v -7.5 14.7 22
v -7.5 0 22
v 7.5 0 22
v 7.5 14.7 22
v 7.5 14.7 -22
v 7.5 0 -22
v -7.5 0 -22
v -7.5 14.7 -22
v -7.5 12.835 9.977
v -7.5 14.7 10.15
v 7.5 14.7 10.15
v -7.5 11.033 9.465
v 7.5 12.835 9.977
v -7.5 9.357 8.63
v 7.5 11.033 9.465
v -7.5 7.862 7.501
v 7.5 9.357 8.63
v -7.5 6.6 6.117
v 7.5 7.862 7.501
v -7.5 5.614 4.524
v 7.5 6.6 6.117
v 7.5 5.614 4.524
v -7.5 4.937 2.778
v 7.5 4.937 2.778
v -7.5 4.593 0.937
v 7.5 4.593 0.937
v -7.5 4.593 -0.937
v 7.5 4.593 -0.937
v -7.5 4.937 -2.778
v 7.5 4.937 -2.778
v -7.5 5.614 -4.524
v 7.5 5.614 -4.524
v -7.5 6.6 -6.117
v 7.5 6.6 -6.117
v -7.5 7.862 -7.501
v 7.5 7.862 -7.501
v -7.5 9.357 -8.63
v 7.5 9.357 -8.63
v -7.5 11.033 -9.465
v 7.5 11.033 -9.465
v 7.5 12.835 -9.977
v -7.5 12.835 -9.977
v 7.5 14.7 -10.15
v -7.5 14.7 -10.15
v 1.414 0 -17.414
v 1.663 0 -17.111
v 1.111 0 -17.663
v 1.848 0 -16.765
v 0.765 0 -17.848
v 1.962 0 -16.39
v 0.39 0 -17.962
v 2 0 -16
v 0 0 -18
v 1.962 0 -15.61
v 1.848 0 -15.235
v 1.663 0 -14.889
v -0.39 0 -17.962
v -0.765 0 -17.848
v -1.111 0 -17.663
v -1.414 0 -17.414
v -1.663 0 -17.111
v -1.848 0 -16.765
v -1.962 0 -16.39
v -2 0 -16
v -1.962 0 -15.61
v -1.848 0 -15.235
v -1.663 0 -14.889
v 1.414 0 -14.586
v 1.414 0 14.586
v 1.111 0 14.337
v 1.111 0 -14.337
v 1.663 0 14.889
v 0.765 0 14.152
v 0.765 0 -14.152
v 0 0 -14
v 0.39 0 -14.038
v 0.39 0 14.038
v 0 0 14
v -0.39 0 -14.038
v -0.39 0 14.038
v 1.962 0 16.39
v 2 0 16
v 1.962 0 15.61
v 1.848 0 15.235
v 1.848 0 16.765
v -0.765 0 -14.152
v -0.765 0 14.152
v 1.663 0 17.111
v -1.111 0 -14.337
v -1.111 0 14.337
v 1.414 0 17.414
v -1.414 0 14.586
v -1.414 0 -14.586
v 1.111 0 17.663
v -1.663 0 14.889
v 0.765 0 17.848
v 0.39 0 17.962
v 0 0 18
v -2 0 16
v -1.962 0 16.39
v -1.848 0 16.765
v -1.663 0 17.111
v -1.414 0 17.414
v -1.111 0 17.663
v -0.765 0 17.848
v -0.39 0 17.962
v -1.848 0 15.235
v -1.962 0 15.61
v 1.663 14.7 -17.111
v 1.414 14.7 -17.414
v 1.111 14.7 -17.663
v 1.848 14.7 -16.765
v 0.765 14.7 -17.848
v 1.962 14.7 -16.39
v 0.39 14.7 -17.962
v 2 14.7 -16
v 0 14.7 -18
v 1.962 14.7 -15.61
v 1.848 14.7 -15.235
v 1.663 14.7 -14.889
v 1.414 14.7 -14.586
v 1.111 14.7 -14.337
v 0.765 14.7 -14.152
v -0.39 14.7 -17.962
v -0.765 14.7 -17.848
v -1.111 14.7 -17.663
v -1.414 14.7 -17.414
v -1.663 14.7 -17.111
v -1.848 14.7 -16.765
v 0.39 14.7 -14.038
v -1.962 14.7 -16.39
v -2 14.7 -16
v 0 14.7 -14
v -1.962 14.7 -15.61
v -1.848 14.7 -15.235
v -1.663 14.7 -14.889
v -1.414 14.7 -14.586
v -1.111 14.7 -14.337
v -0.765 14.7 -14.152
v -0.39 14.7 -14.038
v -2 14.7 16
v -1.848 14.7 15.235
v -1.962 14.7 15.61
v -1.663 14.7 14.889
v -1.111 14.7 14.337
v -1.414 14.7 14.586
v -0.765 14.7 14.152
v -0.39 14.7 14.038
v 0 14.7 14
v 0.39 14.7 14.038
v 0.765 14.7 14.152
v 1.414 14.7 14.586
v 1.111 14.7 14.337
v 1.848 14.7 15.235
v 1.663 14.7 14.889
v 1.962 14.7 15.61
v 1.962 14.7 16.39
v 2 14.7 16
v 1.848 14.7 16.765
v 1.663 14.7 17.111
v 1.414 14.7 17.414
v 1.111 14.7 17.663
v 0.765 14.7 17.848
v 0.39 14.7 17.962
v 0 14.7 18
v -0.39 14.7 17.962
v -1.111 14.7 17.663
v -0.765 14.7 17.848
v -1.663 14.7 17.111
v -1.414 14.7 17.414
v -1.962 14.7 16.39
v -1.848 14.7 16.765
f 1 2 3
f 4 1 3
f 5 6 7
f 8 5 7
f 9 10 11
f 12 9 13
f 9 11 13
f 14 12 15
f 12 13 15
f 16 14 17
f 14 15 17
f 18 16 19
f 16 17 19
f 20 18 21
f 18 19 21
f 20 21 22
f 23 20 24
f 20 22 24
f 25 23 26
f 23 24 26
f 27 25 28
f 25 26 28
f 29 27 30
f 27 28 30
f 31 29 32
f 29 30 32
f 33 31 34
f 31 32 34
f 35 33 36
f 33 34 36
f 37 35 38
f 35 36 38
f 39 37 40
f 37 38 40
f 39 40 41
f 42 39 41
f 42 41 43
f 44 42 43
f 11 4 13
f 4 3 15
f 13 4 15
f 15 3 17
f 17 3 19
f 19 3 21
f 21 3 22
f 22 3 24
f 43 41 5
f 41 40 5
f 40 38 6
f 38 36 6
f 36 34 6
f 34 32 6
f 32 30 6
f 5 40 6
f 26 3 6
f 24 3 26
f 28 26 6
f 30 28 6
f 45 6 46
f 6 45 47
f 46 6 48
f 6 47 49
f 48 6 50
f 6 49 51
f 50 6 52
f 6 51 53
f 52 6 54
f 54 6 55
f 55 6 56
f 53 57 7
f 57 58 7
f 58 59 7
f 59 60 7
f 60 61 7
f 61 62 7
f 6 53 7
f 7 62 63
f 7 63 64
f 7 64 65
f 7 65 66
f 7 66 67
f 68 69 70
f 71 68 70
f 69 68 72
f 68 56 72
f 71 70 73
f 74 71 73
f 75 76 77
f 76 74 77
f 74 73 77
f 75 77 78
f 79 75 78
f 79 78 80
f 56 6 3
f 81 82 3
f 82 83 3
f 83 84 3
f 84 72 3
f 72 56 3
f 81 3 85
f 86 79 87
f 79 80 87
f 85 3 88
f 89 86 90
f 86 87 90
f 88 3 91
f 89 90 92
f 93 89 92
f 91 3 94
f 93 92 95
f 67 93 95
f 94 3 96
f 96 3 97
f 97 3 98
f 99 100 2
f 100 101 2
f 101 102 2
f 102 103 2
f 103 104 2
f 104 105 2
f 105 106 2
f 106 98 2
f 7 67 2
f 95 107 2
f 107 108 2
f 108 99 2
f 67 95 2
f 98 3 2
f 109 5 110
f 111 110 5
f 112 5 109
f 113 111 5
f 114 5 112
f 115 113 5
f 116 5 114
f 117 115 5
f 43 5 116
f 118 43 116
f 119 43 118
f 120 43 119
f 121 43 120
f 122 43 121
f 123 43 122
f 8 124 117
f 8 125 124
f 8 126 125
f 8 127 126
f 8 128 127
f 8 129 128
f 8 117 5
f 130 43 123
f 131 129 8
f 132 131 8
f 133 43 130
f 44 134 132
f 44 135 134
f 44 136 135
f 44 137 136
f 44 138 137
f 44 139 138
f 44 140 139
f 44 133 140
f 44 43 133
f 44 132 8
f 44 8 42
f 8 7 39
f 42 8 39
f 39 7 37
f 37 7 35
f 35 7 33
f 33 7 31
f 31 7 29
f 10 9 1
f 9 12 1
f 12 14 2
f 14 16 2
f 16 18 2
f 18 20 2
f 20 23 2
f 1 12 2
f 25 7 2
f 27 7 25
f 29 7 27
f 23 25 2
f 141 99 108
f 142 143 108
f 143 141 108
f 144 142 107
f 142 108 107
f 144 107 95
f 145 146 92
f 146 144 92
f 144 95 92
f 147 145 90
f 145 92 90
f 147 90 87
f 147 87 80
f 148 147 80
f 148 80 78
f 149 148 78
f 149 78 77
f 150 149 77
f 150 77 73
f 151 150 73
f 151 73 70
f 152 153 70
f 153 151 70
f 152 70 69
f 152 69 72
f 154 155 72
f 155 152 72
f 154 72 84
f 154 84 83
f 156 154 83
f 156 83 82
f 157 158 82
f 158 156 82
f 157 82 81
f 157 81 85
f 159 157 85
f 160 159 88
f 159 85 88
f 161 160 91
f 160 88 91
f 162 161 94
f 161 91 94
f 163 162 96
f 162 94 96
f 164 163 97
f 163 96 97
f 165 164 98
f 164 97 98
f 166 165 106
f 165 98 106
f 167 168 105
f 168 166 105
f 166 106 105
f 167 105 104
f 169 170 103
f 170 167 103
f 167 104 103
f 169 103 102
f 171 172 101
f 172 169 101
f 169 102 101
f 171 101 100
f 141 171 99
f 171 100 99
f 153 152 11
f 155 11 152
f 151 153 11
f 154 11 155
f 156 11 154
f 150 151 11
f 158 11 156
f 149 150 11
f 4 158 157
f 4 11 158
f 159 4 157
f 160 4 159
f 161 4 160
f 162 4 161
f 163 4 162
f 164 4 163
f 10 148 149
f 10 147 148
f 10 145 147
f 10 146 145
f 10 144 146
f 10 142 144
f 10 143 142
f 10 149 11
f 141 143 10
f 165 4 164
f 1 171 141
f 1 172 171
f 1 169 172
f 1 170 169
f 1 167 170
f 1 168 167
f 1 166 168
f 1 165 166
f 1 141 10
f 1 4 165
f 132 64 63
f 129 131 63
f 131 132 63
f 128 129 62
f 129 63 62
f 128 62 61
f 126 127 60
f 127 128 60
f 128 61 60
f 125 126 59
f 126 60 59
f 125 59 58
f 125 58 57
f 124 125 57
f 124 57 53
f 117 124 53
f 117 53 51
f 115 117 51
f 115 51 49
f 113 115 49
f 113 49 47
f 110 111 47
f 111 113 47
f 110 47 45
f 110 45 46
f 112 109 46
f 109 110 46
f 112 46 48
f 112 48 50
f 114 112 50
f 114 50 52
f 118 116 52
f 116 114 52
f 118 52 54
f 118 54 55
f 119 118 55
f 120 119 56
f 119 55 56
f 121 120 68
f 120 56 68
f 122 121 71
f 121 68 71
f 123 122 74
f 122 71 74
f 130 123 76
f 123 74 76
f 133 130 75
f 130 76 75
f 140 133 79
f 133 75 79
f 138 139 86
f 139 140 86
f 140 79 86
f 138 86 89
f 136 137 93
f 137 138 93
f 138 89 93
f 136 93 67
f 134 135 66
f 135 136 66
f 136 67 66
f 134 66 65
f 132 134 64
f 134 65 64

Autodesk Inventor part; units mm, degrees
ref_plane "YZ Plane" through (0, 0, 0) normal (1, 0, 0) x (0, 1, 0)
ref_plane "XZ Plane" through (0, 0, 0) normal (0, 1, 0) x (-1, 0, 0)
ref_plane "XY Plane" through (0, 0, 0) normal (0, 0, 1) x (1, 0, 0)
sketch "Эскиз1" plane through (0, 0, 0) normal (0, 1, 0) x (-1, 0, 0)
  line L0 (7.5, 22) -> (-7.5, 22)
  line L1 (-7.5, 22) -> (-7.5, -22)
  line L2 (-7.5, -22) -> (7.5, -22)
  line L3 (7.5, -22) -> (7.5, 22)
  line L4 (-7.5, 22) -> (7.5, -22) construction
  line L5 (0, 22) -> (0, -22) construction
  circle A0 centre (0, 16) radius 2
  line L6 (7.5, 0) -> (-7.5, 0) construction
  circle A1 centre (0, -16) radius 2
  point P0 (0, 0)
  point P1 (0, 0)
  dimension "d0" = 15
  dimension "d1" = 44
  dimension "d2" = 16
  dimension "d3" = 4
extrude "Выдавливание1" add sketch "Эскиз1" along normal blind 14.7
sketch "Эскиз2" plane through (7.5, 0, 22) normal (1, 0, 0) x (0, 0, -1)
  line L0 (0, 14.7) -> (44, 14.7) projected
  circle A0 centre (22, 14.7) radius 10.15
  point P0 (22, 0)
  dimension "Диаметр_мотора" = 20.3
extrude "Выдавливание2" cut sketch "Эскиз2" against normal through all
properties part number "motor_mount_edge_part2-01"
